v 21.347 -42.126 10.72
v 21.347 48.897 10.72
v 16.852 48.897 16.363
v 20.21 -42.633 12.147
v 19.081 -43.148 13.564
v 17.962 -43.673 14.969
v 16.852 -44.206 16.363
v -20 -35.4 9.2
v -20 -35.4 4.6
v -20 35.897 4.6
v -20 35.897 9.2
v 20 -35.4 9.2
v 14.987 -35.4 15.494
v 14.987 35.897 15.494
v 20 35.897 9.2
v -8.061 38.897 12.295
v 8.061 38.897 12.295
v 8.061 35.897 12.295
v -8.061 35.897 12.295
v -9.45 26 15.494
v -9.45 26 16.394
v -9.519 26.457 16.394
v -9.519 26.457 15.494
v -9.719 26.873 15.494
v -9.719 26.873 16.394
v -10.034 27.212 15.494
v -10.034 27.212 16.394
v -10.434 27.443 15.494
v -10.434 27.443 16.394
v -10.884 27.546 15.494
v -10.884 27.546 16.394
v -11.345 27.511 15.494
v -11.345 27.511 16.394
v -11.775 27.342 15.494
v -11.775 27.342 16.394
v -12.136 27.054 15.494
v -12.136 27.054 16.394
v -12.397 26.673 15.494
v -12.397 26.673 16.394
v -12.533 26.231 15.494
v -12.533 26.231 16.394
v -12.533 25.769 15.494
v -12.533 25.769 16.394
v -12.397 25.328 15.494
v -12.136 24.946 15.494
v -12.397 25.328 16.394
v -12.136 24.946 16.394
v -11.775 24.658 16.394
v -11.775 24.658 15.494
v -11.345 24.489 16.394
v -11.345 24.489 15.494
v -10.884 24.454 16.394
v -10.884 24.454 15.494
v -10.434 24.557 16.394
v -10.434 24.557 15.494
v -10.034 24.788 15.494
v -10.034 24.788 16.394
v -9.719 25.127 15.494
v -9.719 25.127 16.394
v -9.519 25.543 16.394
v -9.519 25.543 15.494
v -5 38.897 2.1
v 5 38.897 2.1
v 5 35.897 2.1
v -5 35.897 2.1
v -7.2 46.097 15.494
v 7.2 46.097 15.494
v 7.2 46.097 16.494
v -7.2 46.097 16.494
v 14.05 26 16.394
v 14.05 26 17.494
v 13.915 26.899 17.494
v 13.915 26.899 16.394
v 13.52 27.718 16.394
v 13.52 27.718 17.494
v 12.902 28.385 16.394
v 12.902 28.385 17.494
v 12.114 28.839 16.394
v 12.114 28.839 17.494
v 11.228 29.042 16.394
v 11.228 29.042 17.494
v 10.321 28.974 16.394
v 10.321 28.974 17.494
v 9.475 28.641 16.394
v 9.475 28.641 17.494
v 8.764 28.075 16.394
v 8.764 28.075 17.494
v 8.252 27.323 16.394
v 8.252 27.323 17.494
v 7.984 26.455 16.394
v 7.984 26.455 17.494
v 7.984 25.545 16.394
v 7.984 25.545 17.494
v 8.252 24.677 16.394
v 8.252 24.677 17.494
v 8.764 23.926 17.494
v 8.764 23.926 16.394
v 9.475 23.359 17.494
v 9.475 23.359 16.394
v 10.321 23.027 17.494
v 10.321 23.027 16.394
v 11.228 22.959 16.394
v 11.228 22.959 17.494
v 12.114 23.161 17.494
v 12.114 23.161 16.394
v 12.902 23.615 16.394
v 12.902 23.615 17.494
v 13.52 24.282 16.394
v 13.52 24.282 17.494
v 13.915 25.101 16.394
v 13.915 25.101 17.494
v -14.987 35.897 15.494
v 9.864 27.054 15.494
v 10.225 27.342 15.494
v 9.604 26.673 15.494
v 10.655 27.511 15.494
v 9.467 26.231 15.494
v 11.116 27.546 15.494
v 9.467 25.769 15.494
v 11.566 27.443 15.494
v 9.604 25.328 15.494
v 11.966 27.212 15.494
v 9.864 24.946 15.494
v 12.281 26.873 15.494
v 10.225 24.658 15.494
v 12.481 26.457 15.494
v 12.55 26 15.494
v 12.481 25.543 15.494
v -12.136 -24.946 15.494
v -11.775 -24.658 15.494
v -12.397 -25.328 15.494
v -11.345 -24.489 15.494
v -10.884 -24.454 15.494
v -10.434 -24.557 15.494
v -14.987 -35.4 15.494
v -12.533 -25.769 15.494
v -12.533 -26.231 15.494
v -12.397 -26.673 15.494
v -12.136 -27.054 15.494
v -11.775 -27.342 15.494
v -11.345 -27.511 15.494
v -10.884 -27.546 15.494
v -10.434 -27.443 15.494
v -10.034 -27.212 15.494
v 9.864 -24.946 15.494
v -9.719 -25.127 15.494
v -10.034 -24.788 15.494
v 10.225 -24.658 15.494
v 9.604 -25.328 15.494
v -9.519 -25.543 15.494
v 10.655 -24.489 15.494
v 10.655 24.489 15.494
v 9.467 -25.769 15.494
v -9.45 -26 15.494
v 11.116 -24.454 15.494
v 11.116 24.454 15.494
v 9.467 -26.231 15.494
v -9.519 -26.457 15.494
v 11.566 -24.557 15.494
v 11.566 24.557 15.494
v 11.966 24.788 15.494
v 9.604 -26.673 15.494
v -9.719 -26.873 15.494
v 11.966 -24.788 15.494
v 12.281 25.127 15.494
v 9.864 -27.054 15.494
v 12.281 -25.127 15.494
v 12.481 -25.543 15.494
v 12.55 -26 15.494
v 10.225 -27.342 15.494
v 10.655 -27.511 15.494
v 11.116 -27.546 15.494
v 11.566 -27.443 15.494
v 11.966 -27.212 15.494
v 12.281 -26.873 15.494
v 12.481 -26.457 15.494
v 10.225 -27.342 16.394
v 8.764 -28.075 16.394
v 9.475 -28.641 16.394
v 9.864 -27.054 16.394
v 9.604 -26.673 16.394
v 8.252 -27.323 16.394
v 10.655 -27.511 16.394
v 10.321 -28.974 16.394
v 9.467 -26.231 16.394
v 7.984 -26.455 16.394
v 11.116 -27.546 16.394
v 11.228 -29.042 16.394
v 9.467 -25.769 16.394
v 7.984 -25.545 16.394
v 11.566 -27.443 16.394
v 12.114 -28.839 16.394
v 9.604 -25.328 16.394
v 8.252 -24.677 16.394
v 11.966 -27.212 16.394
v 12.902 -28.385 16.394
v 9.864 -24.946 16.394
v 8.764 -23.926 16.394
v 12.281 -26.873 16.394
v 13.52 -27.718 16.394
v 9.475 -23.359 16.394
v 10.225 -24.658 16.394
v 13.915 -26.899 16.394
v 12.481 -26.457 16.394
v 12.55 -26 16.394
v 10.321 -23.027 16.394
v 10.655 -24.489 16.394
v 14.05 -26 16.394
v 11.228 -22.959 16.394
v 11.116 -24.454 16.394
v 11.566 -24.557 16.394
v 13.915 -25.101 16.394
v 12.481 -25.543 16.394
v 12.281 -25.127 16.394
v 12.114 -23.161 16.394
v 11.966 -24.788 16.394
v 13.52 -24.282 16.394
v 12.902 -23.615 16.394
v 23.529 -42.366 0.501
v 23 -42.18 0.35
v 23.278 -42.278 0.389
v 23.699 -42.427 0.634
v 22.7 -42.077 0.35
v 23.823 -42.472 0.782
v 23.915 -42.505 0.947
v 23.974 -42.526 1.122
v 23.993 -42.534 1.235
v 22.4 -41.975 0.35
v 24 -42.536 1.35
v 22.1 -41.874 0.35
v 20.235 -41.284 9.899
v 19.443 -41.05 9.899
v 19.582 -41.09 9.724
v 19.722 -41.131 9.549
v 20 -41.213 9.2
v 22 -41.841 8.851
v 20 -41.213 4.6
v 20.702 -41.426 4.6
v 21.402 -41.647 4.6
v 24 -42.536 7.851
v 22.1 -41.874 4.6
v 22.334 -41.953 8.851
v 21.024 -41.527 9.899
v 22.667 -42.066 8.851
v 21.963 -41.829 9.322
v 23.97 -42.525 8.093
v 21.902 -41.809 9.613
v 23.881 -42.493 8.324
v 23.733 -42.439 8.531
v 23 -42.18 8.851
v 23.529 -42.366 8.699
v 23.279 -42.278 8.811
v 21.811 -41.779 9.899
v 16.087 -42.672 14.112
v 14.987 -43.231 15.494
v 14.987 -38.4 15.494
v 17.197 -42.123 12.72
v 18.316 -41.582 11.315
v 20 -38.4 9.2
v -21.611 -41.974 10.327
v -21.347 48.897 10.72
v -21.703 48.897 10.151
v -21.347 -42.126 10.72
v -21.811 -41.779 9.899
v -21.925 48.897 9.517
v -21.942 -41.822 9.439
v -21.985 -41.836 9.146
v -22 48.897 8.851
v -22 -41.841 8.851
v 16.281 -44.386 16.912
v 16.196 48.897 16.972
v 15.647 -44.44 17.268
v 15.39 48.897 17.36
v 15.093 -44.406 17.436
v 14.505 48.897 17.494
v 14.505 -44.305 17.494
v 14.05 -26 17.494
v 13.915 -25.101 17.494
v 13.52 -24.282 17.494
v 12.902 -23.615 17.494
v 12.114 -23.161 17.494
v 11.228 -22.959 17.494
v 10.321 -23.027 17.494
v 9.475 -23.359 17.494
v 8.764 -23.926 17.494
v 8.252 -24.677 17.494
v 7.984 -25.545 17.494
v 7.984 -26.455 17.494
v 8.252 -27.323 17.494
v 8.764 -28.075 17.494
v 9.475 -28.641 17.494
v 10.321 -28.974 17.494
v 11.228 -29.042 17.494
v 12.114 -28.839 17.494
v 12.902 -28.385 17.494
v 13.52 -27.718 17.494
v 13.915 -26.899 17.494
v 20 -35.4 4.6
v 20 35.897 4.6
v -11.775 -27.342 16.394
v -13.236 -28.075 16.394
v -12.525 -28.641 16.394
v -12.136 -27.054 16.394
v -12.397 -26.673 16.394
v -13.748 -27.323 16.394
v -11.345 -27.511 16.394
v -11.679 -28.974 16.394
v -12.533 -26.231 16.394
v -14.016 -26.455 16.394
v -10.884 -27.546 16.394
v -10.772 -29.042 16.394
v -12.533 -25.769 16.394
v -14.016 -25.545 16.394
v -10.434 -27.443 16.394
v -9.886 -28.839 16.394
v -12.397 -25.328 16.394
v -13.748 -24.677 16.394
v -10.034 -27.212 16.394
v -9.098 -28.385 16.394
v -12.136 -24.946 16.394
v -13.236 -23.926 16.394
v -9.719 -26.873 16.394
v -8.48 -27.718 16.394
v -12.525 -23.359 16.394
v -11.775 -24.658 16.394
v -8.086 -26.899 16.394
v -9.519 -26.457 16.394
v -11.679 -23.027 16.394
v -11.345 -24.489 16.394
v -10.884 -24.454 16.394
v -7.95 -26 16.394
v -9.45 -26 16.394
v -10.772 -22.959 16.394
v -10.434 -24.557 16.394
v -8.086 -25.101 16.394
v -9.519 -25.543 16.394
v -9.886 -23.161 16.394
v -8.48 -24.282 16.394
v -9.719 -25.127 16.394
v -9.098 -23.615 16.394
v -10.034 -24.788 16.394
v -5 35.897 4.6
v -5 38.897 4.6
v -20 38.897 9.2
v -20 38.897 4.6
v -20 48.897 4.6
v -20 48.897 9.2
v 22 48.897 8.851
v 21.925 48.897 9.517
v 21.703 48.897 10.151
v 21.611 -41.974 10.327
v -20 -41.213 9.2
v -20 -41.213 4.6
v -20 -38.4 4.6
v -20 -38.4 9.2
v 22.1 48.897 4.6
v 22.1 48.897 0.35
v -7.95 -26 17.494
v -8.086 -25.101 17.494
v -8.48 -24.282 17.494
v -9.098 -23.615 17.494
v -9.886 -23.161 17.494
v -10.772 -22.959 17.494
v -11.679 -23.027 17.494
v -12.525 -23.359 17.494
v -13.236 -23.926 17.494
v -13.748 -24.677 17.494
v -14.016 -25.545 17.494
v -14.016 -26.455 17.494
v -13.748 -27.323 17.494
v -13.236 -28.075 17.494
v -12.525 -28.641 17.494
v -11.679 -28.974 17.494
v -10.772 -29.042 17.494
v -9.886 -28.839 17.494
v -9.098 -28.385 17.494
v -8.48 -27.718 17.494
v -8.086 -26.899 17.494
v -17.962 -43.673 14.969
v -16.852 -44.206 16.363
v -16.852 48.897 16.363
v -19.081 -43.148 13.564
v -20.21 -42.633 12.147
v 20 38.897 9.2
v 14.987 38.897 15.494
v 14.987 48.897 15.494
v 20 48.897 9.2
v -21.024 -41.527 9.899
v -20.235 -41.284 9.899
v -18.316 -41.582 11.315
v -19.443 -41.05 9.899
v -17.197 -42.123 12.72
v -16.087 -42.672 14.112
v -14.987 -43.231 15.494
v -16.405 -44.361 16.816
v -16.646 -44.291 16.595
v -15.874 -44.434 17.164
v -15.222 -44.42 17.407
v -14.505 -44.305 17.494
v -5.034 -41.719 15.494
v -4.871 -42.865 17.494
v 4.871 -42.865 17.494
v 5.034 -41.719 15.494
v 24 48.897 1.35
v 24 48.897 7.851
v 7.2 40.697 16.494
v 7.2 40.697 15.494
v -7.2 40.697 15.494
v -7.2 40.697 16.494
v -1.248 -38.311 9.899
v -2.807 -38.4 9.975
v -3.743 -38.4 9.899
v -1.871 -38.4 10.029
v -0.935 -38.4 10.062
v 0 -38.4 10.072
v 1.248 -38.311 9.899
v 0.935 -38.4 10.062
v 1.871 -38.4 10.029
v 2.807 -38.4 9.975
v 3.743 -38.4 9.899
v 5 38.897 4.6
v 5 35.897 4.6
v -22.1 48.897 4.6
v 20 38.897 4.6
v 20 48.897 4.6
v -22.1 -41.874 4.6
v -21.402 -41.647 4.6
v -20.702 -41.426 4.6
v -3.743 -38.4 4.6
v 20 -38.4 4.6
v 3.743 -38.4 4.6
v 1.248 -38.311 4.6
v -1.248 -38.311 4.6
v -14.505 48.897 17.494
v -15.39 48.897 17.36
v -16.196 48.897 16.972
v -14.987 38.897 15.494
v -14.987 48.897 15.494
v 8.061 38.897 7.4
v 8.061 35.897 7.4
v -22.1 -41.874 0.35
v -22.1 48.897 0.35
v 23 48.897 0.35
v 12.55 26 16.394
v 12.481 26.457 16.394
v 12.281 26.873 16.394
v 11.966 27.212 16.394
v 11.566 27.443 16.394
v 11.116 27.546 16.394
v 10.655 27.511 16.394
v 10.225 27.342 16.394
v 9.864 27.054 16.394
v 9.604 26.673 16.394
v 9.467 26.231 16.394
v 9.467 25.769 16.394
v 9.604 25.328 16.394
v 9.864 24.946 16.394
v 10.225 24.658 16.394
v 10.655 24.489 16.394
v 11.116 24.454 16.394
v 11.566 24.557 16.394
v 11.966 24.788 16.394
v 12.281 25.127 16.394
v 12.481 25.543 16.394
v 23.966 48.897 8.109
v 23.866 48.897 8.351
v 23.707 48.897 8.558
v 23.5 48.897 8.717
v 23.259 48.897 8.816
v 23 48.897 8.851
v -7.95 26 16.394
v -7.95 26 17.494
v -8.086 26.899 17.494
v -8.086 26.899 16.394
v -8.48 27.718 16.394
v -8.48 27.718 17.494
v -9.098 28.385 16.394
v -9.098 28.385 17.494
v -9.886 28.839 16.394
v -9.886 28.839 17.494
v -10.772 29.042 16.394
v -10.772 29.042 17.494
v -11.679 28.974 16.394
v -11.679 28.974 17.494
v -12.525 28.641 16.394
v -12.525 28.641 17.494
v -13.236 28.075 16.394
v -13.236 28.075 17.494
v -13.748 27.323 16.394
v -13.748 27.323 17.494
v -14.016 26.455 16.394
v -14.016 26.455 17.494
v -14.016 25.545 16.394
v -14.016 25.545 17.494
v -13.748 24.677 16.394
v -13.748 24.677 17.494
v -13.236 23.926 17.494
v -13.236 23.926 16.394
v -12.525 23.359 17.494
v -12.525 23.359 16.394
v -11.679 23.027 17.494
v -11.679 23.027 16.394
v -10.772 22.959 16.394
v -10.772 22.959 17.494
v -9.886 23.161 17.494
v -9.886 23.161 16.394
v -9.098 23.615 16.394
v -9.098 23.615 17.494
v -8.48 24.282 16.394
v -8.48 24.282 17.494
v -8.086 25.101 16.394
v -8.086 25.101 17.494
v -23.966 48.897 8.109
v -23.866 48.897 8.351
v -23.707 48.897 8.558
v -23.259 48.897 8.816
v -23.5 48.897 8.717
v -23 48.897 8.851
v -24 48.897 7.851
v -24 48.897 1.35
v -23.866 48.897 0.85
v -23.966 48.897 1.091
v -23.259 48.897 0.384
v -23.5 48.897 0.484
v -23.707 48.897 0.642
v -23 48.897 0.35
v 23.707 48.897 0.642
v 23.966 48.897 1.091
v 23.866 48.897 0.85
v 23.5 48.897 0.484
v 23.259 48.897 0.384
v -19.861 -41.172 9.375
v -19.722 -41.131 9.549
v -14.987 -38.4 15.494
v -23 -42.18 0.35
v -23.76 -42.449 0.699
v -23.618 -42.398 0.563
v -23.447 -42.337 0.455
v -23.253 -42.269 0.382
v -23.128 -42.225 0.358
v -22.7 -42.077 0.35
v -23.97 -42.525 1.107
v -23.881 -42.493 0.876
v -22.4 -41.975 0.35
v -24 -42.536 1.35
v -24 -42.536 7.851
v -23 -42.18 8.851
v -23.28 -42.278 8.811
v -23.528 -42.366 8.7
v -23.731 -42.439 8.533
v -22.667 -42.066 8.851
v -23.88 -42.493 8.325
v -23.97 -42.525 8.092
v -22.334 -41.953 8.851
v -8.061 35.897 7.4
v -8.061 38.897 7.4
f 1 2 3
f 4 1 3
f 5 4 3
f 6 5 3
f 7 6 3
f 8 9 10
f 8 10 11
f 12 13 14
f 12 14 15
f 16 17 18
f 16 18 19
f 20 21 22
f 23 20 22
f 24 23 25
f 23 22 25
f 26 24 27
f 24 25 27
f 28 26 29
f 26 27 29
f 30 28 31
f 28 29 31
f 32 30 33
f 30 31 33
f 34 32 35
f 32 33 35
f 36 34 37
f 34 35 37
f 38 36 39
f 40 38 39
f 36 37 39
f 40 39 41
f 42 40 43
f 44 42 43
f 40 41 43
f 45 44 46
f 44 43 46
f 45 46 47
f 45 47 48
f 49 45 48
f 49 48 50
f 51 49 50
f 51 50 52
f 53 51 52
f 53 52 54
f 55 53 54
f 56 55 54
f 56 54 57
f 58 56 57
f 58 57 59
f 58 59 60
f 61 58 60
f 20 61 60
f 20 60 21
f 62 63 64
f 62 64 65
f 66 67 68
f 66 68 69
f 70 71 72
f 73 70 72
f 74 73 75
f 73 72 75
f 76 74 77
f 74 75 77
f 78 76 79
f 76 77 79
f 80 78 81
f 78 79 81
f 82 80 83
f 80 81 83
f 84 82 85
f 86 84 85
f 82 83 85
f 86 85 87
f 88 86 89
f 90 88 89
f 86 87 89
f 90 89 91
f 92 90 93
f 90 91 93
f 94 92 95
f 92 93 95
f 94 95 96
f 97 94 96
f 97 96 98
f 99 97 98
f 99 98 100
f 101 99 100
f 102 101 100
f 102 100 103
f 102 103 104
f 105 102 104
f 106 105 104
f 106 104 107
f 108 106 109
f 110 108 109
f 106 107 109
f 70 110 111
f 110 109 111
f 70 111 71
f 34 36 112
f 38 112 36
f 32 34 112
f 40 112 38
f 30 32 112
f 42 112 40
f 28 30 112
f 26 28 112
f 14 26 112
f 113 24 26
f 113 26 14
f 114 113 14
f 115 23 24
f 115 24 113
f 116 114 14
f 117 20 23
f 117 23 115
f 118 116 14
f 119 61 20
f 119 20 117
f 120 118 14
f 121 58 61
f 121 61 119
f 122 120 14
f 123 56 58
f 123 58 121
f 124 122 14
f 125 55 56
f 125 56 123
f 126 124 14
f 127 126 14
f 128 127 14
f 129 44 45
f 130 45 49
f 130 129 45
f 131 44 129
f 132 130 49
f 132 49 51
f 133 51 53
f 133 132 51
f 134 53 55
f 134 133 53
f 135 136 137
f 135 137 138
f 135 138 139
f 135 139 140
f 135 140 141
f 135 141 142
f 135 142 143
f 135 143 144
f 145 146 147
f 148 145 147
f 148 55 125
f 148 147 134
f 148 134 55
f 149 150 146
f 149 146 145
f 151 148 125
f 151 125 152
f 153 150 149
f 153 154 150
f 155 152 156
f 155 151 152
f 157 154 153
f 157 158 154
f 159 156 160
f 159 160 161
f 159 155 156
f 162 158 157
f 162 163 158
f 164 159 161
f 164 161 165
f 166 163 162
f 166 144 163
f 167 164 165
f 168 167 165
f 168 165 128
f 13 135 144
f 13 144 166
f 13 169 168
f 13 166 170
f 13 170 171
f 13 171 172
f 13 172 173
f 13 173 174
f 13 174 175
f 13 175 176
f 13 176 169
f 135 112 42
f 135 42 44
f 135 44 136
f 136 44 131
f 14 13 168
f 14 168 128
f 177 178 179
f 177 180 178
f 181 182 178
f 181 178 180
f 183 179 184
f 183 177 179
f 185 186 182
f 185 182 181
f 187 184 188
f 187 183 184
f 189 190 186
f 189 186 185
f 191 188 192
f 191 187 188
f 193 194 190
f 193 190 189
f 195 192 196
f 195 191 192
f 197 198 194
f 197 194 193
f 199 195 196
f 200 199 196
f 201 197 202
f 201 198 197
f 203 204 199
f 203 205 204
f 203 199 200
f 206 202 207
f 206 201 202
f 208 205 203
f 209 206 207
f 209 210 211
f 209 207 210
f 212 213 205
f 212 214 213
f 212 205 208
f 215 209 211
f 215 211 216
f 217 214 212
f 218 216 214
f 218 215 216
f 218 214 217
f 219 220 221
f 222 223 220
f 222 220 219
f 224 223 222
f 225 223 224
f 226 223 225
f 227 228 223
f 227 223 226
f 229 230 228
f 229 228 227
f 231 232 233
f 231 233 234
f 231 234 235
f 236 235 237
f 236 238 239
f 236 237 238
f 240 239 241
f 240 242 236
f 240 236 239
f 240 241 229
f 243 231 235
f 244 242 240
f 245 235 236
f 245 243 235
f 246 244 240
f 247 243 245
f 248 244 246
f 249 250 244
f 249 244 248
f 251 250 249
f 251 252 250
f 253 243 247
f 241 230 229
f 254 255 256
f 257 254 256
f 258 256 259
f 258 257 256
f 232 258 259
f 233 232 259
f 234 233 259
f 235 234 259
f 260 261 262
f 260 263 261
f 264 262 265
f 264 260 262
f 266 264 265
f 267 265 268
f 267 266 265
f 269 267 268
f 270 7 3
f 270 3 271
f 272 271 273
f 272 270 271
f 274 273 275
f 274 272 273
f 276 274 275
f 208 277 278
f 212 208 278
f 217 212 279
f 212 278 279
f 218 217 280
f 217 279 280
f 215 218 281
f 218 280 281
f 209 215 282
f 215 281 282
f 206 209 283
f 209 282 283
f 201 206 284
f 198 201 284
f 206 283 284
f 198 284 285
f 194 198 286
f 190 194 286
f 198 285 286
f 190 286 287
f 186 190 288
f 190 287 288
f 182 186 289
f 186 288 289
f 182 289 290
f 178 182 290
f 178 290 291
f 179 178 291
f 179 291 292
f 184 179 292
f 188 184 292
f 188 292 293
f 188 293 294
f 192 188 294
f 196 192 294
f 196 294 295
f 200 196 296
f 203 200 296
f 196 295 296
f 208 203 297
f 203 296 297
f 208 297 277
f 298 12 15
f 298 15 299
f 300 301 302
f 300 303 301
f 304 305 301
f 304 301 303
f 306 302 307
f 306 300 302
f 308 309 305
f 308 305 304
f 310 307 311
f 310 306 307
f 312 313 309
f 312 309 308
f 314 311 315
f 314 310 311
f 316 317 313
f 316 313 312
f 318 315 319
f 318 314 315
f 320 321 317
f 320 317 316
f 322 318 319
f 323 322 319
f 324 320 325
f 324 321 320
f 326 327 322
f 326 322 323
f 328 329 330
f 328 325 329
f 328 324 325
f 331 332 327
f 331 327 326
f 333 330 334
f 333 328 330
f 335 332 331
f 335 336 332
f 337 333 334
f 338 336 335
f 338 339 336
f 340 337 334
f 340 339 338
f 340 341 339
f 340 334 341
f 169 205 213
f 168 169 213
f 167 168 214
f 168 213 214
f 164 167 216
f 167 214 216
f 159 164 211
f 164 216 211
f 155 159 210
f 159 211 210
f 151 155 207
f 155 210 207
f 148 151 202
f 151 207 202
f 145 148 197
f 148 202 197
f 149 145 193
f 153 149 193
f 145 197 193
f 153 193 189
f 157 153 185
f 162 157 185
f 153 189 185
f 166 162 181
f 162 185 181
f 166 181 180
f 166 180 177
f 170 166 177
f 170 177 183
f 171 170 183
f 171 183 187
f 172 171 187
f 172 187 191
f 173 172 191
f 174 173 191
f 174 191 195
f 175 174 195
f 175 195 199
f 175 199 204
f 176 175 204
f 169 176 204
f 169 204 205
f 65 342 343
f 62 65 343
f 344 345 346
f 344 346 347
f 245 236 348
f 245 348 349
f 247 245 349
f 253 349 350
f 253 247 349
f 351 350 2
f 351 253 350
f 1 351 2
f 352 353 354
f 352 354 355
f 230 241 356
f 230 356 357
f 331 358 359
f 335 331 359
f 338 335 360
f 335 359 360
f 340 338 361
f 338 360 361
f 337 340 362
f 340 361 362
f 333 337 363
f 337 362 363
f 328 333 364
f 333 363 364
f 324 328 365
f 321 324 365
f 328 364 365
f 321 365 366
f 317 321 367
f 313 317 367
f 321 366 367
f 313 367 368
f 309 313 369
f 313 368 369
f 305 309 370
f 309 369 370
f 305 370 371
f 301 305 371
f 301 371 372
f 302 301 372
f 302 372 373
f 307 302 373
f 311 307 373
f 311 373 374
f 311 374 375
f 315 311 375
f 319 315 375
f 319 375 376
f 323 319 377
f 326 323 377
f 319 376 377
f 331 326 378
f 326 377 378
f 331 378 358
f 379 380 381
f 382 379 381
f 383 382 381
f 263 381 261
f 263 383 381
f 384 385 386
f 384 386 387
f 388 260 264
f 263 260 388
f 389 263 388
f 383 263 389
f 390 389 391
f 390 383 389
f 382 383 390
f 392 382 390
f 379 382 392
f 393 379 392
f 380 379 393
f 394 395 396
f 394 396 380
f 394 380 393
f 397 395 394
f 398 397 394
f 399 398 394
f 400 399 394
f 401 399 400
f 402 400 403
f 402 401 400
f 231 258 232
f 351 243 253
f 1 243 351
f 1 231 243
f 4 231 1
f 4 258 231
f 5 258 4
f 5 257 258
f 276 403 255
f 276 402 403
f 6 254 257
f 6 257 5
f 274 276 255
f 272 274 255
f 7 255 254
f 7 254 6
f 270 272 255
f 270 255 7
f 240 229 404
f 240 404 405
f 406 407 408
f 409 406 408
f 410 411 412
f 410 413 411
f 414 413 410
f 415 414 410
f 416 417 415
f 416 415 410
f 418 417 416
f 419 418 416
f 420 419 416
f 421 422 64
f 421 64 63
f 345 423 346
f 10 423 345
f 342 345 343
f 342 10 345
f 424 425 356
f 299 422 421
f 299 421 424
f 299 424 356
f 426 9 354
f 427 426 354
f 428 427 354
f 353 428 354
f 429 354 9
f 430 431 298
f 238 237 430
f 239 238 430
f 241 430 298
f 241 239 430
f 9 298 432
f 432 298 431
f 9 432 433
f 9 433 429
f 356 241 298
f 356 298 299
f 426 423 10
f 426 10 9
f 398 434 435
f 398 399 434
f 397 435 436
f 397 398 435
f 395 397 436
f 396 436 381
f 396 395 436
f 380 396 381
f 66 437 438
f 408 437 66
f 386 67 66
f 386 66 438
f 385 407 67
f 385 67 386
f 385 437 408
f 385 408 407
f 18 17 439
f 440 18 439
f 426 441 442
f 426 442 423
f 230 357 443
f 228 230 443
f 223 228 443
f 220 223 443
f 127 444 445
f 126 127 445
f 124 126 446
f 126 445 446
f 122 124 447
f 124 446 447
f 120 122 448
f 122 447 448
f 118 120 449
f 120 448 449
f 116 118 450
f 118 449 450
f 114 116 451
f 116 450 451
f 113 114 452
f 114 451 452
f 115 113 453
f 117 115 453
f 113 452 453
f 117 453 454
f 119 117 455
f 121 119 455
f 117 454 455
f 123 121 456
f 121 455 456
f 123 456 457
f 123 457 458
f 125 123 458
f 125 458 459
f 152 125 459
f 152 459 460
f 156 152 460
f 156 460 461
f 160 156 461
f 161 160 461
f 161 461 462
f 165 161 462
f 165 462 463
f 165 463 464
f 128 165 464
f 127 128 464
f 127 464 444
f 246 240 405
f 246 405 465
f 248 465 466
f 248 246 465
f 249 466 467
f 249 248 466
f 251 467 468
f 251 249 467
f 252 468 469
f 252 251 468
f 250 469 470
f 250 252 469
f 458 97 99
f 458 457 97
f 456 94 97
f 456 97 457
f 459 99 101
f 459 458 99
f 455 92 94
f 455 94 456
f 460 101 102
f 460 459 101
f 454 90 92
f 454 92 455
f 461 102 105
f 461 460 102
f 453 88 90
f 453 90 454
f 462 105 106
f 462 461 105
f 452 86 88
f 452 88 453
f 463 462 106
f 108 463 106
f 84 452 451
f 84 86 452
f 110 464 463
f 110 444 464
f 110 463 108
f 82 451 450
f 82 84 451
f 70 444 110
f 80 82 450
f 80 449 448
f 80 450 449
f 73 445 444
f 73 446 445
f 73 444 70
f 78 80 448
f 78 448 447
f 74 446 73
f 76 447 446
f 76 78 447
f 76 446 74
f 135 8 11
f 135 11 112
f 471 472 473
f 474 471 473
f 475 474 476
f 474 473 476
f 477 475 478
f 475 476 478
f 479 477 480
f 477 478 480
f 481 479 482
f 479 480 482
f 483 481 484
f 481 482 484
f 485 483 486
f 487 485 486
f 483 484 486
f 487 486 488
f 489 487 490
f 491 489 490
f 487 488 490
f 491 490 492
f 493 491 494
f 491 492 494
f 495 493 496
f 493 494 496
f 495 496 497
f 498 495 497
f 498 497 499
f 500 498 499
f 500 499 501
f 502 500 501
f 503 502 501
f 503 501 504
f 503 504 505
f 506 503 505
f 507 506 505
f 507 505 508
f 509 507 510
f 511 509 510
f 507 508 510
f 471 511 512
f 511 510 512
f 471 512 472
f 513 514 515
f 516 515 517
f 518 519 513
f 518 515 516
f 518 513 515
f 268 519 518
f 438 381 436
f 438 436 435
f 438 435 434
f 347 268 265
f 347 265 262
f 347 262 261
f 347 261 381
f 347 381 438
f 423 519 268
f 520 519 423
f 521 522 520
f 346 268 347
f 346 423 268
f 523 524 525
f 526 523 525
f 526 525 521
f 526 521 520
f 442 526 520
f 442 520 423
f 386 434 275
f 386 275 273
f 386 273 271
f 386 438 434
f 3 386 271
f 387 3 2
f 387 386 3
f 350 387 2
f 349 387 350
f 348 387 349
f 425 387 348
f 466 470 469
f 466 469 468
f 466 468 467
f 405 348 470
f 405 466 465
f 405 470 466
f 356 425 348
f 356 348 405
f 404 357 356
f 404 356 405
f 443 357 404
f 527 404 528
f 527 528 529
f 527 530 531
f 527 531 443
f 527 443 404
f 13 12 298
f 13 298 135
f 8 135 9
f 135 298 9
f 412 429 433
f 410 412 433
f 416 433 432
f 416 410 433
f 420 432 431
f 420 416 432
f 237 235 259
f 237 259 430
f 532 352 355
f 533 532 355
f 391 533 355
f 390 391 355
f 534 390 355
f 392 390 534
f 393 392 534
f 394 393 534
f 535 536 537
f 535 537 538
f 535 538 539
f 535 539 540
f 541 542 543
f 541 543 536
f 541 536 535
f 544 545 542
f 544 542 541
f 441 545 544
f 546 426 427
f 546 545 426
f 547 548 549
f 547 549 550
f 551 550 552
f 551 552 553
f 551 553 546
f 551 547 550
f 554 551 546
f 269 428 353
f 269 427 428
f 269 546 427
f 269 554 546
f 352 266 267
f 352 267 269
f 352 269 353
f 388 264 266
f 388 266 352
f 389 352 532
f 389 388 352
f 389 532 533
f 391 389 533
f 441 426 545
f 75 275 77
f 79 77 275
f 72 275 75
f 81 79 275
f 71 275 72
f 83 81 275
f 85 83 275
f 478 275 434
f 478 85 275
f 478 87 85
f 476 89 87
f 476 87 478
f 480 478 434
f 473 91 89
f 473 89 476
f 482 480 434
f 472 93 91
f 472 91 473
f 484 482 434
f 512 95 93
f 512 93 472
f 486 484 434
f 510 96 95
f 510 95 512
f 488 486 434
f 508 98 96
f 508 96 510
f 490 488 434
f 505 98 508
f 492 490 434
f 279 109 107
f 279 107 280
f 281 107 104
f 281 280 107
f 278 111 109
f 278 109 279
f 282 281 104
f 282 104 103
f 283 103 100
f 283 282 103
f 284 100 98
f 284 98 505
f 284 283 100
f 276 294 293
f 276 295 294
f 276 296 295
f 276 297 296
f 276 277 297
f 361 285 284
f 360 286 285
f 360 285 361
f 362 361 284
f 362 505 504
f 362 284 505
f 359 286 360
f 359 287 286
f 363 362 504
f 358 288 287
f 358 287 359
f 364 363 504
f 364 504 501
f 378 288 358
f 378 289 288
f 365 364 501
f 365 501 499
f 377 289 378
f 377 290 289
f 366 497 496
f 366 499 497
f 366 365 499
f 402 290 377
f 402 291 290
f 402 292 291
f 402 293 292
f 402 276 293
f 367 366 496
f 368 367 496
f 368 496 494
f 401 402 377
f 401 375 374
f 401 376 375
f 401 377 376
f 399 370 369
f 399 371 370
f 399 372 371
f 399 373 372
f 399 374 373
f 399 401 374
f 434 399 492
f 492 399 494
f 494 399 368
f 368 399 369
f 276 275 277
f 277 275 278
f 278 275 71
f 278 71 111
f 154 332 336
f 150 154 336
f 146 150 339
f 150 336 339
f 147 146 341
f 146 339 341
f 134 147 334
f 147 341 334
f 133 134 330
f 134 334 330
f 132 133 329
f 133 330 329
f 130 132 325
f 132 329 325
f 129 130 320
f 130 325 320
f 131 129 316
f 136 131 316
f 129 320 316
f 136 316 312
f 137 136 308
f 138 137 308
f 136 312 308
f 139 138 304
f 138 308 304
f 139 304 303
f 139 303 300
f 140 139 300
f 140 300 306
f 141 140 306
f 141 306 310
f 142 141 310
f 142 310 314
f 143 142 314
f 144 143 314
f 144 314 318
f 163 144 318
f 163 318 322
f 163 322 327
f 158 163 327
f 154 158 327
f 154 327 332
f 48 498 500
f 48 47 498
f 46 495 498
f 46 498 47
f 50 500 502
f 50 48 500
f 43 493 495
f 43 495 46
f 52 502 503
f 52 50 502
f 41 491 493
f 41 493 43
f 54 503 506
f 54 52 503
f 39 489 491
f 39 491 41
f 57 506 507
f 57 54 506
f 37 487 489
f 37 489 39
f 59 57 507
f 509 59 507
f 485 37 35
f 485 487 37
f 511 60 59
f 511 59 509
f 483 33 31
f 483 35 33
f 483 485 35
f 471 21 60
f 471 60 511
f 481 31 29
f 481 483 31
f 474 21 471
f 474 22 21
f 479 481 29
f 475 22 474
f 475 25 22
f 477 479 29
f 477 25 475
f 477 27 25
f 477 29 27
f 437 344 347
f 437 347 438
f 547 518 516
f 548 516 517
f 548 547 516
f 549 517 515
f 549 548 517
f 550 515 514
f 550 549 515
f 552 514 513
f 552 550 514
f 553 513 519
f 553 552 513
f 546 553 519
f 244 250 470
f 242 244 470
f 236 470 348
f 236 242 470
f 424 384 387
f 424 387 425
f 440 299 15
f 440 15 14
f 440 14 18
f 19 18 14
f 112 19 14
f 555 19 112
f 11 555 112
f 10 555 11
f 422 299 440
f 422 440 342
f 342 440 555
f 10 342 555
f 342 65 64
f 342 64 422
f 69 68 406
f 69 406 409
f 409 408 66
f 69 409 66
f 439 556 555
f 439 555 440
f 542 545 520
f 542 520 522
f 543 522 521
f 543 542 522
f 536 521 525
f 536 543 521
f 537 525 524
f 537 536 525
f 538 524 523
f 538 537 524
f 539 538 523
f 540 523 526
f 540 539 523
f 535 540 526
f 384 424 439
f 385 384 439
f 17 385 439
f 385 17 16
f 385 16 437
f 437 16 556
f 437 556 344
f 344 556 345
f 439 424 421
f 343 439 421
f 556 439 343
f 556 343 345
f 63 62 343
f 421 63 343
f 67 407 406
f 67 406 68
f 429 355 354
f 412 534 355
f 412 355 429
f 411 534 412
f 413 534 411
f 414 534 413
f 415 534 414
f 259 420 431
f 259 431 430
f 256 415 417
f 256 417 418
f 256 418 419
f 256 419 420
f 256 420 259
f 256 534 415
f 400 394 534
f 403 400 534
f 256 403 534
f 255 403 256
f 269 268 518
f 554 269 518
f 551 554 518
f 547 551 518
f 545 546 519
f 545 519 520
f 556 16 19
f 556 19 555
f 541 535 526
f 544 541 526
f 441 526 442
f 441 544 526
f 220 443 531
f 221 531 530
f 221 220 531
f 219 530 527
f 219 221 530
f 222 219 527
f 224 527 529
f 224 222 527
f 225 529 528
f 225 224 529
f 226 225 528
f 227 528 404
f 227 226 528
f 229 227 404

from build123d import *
from OCP.BRepAlgoAPI import BRepAlgoAPI_Cut
from OCP.TopTools import TopTools_ListOfShape

# Parameters (mm, degrees)
EXTRUDE_1_DEPTH     = 58.89737674
EXTRUDE_START       = 38.399597665
EXTRUDE_2_DEPTH     = 38.399597665
EXTRUDE_3_REACH     = 66.893
SKETCH_3_W          = 44.2
SKETCH_3_H          = 3
EXTRUDE_4_REACH     = 66.893
SKETCH_4_W          = 44.2
SKETCH_4_H          = 3
CUT_EXTRUDE_START   = -77.29697691
CUT_EXTRUDE_1_DEPTH = 77.29697691
SKETCH_6_W          = 16.122631446
SKETCH_6_H          = 4.394864928
CUT_EXTRUDE_2_DEPTH = 3
EXTRUDE_START_2     = 15
EXTRUDE_5_DEPTH     = 15
SKETCH_11_R         = 3.05
CUT_EXTRUDE_4_DEPTH = 1.1
CUT_EXTRUDE_START_2 = -10
CUT_EXTRUDE_5_DEPTH = 10
SKETCH_14_R         = 1.55
CUT_EXTRUDE_6_DEPTH = 57.783530783
SKETCH_15_W         = 16.122631446
SKETCH_15_H         = 3
CUT_EXTRUDE_7_DEPTH = 0.5
SKETCH_16_W         = 10
SKETCH_16_H         = 3
EXTRUDE_6_DEPTH     = 2.5
SKETCH_17_W         = 14.4
SKETCH_17_H         = 5.4
CUT_EXTRUDE_8_DEPTH = 1


with BuildPart() as part:
    # 草图1 → 凸台-拉伸1 (new body)
    with BuildSketch(Plane(origin=(0, 0, 0), x_dir=(1, 0, 0), z_dir=(0, 1, 0))):
        with BuildLine():
            Line((21.346642729, -10.719560241), (16.852020459, -16.362765964))
            ThreePointArc((16.852020459, -16.362765964), (15.807857901, -17.196247295), (14.505374257, -17.493741725))
            Line((14.505374257, -17.493741725), (-14.505381202, -17.493741725))
            ThreePointArc((-14.505381202, -17.493741725), (-15.807864846, -17.196247295), (-16.852027404, -16.362765964))
            Line((-16.852027404, -16.362765964), (-21.346649674, -10.719560241))
            ThreePointArc((-21.346649674, -10.719560241), (-21.831958504, -9.840501001), (-22.000003473, -8.850536003))
            Line((-22.000003473, -8.850536003), (-23.000003473, -8.850536003))
            ThreePointArc((-23.000003473, -8.850536003), (-23.707110254, -8.557642784), (-24.000003473, -7.850536003))
            Line((-24.000003473, -7.850536003), (-24.000003473, -1.349569462))
            ThreePointArc((-24.000003473, -1.349569462), (-23.707110254, -0.642462681), (-23.000003473, -0.349569462))
            Line((-23.000003473, -0.349569462), (-22.100003473, -0.349569462))
            Line((-22.100003473, -0.349569462), (-22.100003473, -4.600052733))
            Line((-22.100003473, -4.600052733), (-22.000003473, -4.600052733))
            Line((-22.000003473, -4.600052733), (-20.000003473, -4.600052733))
            Line((-20.000003473, -4.600052733), (-20.000003473, -9.200105465))
            Line((-20.000003473, -9.200105465), (-14.987335304, -15.493741725))
            Line((-14.987335304, -15.493741725), (14.987328359, -15.493741725))
            Line((14.987328359, -15.493741725), (19.999996527, -9.200105465))
            Line((19.999996527, -9.200105465), (19.999996527, -4.600052733))
            Line((19.999996527, -4.600052733), (21.999996527, -4.600052733))
            Line((21.999996527, -4.600052733), (22.099996527, -4.600052733))
            Line((22.099996527, -4.600052733), (22.099996527, -0.349569462))
            Line((22.099996527, -0.349569462), (22.999996527, -0.349569462))
            ThreePointArc((22.999996527, -0.349569462), (23.707103309, -0.642462681), (23.999996527, -1.349569462))
            Line((23.999996527, -1.349569462), (23.999996527, -7.850536003))
            ThreePointArc((23.999996527, -7.850536003), (23.707103309, -8.557642784), (22.999996527, -8.850536003))
            Line((22.999996527, -8.850536003), (21.999996527, -8.850536003))
            ThreePointArc((21.999996527, -8.850536003), (21.831951559, -9.840501001), (21.346642729, -10.719560241))
        make_face()
    extrude(amount=EXTRUDE_1_DEPTH)

    # 草图2 → 凸台-拉伸2 (add)
    with BuildSketch(Plane.XZ.offset(EXTRUDE_START)):
        with BuildLine():
            Line((22.999996527, 8.850536003), (21.999996527, 8.850536003))
            ThreePointArc((21.999996527, 8.850536003), (21.831951559, 9.840501001), (21.346642729, 10.719560241))
            Line((21.346642729, 10.719560241), (16.852020459, 16.362765964))
            ThreePointArc((16.852020459, 16.362765964), (15.807857901, 17.196247295), (14.505374257, 17.493741725))
            Line((14.505374257, 17.493741725), (-14.505381202, 17.493741725))
            ThreePointArc((-14.505381202, 17.493741725), (-15.807864846, 17.196247295), (-16.852027404, 16.362765964))
            Line((-16.852027404, 16.362765964), (-21.346649674, 10.719560241))
            ThreePointArc((-21.346649674, 10.719560241), (-21.831958504, 9.840501001), (-22.000003473, 8.850536003))
            Line((-22.000003473, 8.850536003), (-23.000003473, 8.850536003))
            ThreePointArc((-23.000003473, 8.850536003), (-23.707110254, 8.557642784), (-24.000003473, 7.850536003))
            Line((-24.000003473, 7.850536003), (-24.000003473, 1.349569462))
            ThreePointArc((-24.000003473, 1.349569462), (-23.707110254, 0.642462681), (-23.000003473, 0.349569462))
            Line((-23.000003473, 0.349569462), (-22.100003473, 0.349569462))
            Line((-22.100003473, 0.349569462), (-22.100003473, 4.600052733))
            Line((-22.100003473, 4.600052733), (-20.000003473, 4.600052733))
            Line((-20.000003473, 4.600052733), (-20.000003473, 9.200105465))
            Line((-20.000003473, 9.200105465), (-14.987335304, 15.493741725))
            Line((-14.987335304, 15.493741725), (14.987328359, 15.493741725))
            Line((14.987328359, 15.493741725), (19.999996527, 9.200105465))
            Line((19.999996527, 9.200105465), (19.999996527, 4.600052733))
            Line((19.999996527, 4.600052733), (22.099996527, 4.600052733))
            Line((22.099996527, 4.600052733), (22.099996527, 0.349569462))
            Line((22.099996527, 0.349569462), (22.999996527, 0.349569462))
            ThreePointArc((22.999996527, 0.349569462), (23.707103309, 0.642462681), (23.999996527, 1.349569462))
            Line((23.999996527, 1.349569462), (23.999996527, 7.850536003))
            ThreePointArc((23.999996527, 7.850536003), (23.707103309, 8.557642784), (22.999996527, 8.850536003))
        make_face()
    extrude(amount=-EXTRUDE_2_DEPTH)

    # 凸台-拉伸3: up to this face of the body (flat: up to its plane)
    extrude_3_end = Plane(part.part.faces().sort_by_distance((-3.473e-06, 10.248889538, 17.493741725))[0])
    # 草图3 → 凸台-拉伸3 (add, up to the picked face)
    with BuildSketch(Plane(origin=(0, 0, 4.600052733), x_dir=(-1, 0, 0), z_dir=(0, 0, -1)), mode=Mode.PRIVATE) as extrude_3_sk1:
        with Locations((3.473e-06, -36.899597665)):
            Rectangle(SKETCH_3_W, SKETCH_3_H)
    extrude_3_tool1 = split(extrude(extrude_3_sk1.sketch, amount=-EXTRUDE_3_REACH, mode=Mode.PRIVATE), bisect_by=extrude_3_end, keep=Keep.BOTH, mode=Mode.PRIVATE)
    add(extrude_3_tool1.solids().sort_by(Axis((-3e-06, -36.899598, 4.600053), (0, 0, 1)))[0])

    # 凸台-拉伸4: up to this face of the body (flat: up to its plane)
    extrude_4_end = Plane(part.part.faces().sort_by_distance((-3.473e-06, 9.499837909, 17.493741725))[0])
    # 草图4 → 凸台-拉伸4 (add, up to the picked face)
    with BuildSketch(Plane(origin=(0, 0, 4.600052733), x_dir=(-1, 0, 0), z_dir=(0, 0, -1)), mode=Mode.PRIVATE) as extrude_4_sk1:
        with Locations((3.473e-06, 37.397379245)):
            Rectangle(SKETCH_4_W, SKETCH_4_H)
    extrude_4_tool1 = split(extrude(extrude_4_sk1.sketch, amount=-EXTRUDE_4_REACH, mode=Mode.PRIVATE), bisect_by=extrude_4_end, keep=Keep.BOTH, mode=Mode.PRIVATE)
    add(extrude_4_tool1.solids().sort_by(Axis((-3e-06, 37.397379, 4.600053), (0, 0, 1)))[0])

    # 草图5 → 切除-拉伸1 (cut)
    with BuildSketch(Plane(origin=(0, 38.897379245, 0), x_dir=(1, 0, 0), z_dir=(0, 1, 0)).offset(CUT_EXTRUDE_START)):
        with BuildLine():
            Line((-22.100003473, -8.850536003), (-22.100003473, -17.493741725))
            Line((-22.100003473, -17.493741725), (-14.505381202, -17.493741725))
            ThreePointArc((-14.505381202, -17.493741725), (-15.807864846, -17.196247295), (-16.852027404, -16.362765964))
            Line((-16.852027404, -16.362765964), (-21.346649674, -10.719560241))
            ThreePointArc((-21.346649674, -10.719560241), (-21.831958504, -9.840501001), (-22.000003473, -8.850536003))
            Line((-22.000003473, -8.850536003), (-22.100003473, -8.850536003))
        make_face()
        with BuildLine():
            Line((14.505374257, -17.493741725), (22.099996527, -17.493741725))
            Line((22.099996527, -17.493741725), (22.099996527, -8.850536003))
            Line((22.099996527, -8.850536003), (21.999996527, -8.850536003))
            ThreePointArc((21.999996527, -8.850536003), (21.831951559, -9.840501001), (21.346642729, -10.719560241))
            Line((21.346642729, -10.719560241), (16.852020459, -16.362765964))
            ThreePointArc((16.852020459, -16.362765964), (15.807857901, -17.196247295), (14.505374257, -17.493741725))
        make_face()
    extrude(amount=CUT_EXTRUDE_1_DEPTH, mode=Mode.SUBTRACT)

    # 草图6 → 切除-拉伸2 (cut)
    with BuildSketch(Plane(origin=(0, 38.897379245, 0), x_dir=(1, 0, 0), z_dir=(0, 1, 0))):
        with Locations((0, -9.597483264)):
            Rectangle(SKETCH_6_W, SKETCH_6_H)
    extrude(amount=-CUT_EXTRUDE_2_DEPTH, mode=Mode.SUBTRACT)

    # 草图7 → 凸台-拉伸5 (add)
    with BuildSketch(Plane(origin=(0, -38.399597665, 0), x_dir=(-1, 0, 0), z_dir=(0, -1, 0)).offset(EXTRUDE_START_2)):
        with BuildLine():
            Line((20.000003473, -4.600052733), (20.000003473, -9.200105465))
            Line((20.000003473, -9.200105465), (14.987335304, -15.493741725))
            Line((14.987335304, -15.493741725), (-14.987328359, -15.493741725))
            Line((-14.987328359, -15.493741725), (-19.999996527, -9.200105465))
            Line((-19.999996527, -9.200105465), (-19.999996527, -4.600052733))
            Line((-19.999996527, -4.600052733), (-21.999996527, -4.600052733))
            Line((-21.999996527, -4.600052733), (-22.099996527, -4.600052733))
            Line((-22.099996527, -4.600052733), (-22.099996527, -0.349569462))
            Line((-22.099996527, -0.349569462), (-22.999996527, -0.349569462))
            ThreePointArc((-22.999996527, -0.349569462), (-23.707103309, -0.642462681), (-23.999996527, -1.349569462))
            Line((-23.999996527, -1.349569462), (-23.999996527, -7.850536003))
            ThreePointArc((-23.999996527, -7.850536003), (-23.707103309, -8.557642784), (-22.999996527, -8.850536003))
            Line((-22.999996527, -8.850536003), (-21.999996527, -8.850536003))
            ThreePointArc((-21.999996527, -8.850536003), (-21.831951559, -9.840501001), (-21.346642729, -10.719560241))
            Line((-21.346642729, -10.719560241), (-16.852020459, -16.362765964))
            ThreePointArc((-16.852020459, -16.362765964), (-15.807857901, -17.196247295), (-14.505374257, -17.493741725))
            Line((-14.505374257, -17.493741725), (14.505381202, -17.493741725))
            ThreePointArc((14.505381202, -17.493741725), (15.807864846, -17.196247295), (16.852027404, -16.362765964))
            Line((16.852027404, -16.362765964), (21.346649674, -10.719560241))
            ThreePointArc((21.346649674, -10.719560241), (21.831958504, -9.840501001), (22.000003473, -8.850536003))
            Line((22.000003473, -8.850536003), (23.000003473, -8.850536003))
            ThreePointArc((23.000003473, -8.850536003), (23.707110254, -8.557642784), (24.000003473, -7.850536003))
            Line((24.000003473, -7.850536003), (24.000003473, -1.349569462))
            ThreePointArc((24.000003473, -1.349569462), (23.707110254, -0.642462681), (23.000003473, -0.349569462))
            Line((23.000003473, -0.349569462), (22.100003473, -0.349569462))
            Line((22.100003473, -0.349569462), (22.100003473, -4.600052733))
            Line((22.100003473, -4.600052733), (22.000003473, -4.600052733))
            Line((22.000003473, -4.600052733), (20.000003473, -4.600052733))
        make_face()
    extrude(amount=-EXTRUDE_5_DEPTH)

    # 草图8 → 切除-旋转1 (revolve, cut)
    with BuildSketch(Plane(origin=(0, 0, 0), x_dir=(0, 0, -1), z_dir=(1, 0, 0))):
        Polygon((-9.89924439, -38.299597665), (-20.291549236, -44.299597665), (-20.291549236, -55.801852499), (11.09144377, -55.801852499), (11.09144377, -44.299597665), (0.699138925, -38.299597665), align=None)
    revolve(axis=Axis((0, -108.399597665, 9.89924439), (0, 0, -1)), mode=Mode.SUBTRACT)

    # 草图11 → 切除-拉伸4 (cut)
    with BuildSketch(Plane.XY.offset(17.493741725)):
        with Locations((-11.00002286, 26.0000508)):
            Circle(SKETCH_11_R)
        with Locations((11.00002032, 26.0000508)):
            Circle(SKETCH_11_R)
        with Locations((-11.00002286, -26.00005334)):
            Circle(SKETCH_11_R)
        with Locations((11.00002032, -26.00005334)):
            Circle(SKETCH_11_R)
    extrude(amount=-CUT_EXTRUDE_4_DEPTH, mode=Mode.SUBTRACT)


with BuildPart() as cut_extrude_5_tool:
    # 草图13 → 切除-拉伸5 (new body)
    with BuildSketch(Plane(origin=(-3.473e-06, 58.897378066, 0), x_dir=(0.9999999999999983, 5.895855893701837e-08, 0), z_dir=(-5.895855893701837e-08, 0.9999999999999983, 0)).offset(CUT_EXTRUDE_START_2)):
        with BuildLine():
            Line((-23, -8.850536003), (-22, -8.850536003))
            ThreePointArc((-22, -8.850536003), (-21.831955032, -9.840501001), (-21.346646202, -10.719560241))
            Line((-21.346646202, -10.719560241), (-16.852023931, -16.362765964))
            ThreePointArc((-16.852023931, -16.362765964), (-15.807861373, -17.196247295), (-14.50537773, -17.493741725))
            Line((-14.50537773, -17.493741725), (14.50537773, -17.493741725))
            ThreePointArc((14.50537773, -17.493741725), (15.807861373, -17.196247295), (16.852023931, -16.362765964))
            Line((16.852023931, -16.362765964), (21.346646202, -10.719560241))
            ThreePointArc((21.346646202, -10.719560241), (21.831955032, -9.840501001), (22, -8.850536003))
            Line((22, -8.850536003), (23, -8.850536003))
            ThreePointArc((23, -8.850536003), (23.707106781, -8.557642784), (24, -7.850536003))
            Line((24, -7.850536003), (24, -1.349569462))
            ThreePointArc((24, -1.349569462), (23.707106781, -0.642462681), (23, -0.349569462))
            Line((23, -0.349569462), (22.1, -0.349569462))
            Line((22.1, -0.349569462), (22.1, -4.600052733))
            Line((22.1, -4.600052733), (20, -4.600052733))
            Line((20, -4.600052733), (20, -9.200105465))
            Line((20, -9.200105465), (14.987331831, -15.493741725))
            Line((14.987331831, -15.493741725), (-14.987331831, -15.493741725))
            Line((-14.987331831, -15.493741725), (-20, -9.200105465))
            Line((-20, -9.200105465), (-20, -4.600052733))
            Line((-20, -4.600052733), (-22.1, -4.600052733))
            Line((-22.1, -4.600052733), (-22.1, -0.349569462))
            Line((-22.1, -0.349569462), (-23, -0.349569462))
            ThreePointArc((-23, -0.349569462), (-23.707106781, -0.642462681), (-24, -1.349569462))
            Line((-24, -1.349569462), (-24, -7.850536003))
            ThreePointArc((-24, -7.850536003), (-23.707106781, -8.557642784), (-23, -8.850536003))
        make_face()
    extrude(amount=CUT_EXTRUDE_5_DEPTH)


with BuildPart() as part_1:
    add(part.part)

    # 切除-拉伸5: cut by cut_extrude_5_tool, with a tolerance
    cut_extrude_5_stock = TopTools_ListOfShape()
    cut_extrude_5_stock.Append(part_1.part.wrapped)
    cut_extrude_5_tools = TopTools_ListOfShape()
    cut_extrude_5_tools.Append(cut_extrude_5_tool.part.wrapped)
    cut_extrude_5_cut = BRepAlgoAPI_Cut()
    cut_extrude_5_cut.SetArguments(cut_extrude_5_stock)
    cut_extrude_5_cut.SetTools(cut_extrude_5_tools)
    cut_extrude_5_cut.SetFuzzyValue(0.00001)
    cut_extrude_5_cut.Build()
    add(Compound.cast(cut_extrude_5_cut.Shape()).solids(), mode=Mode.REPLACE)

    # 草图14 → 切除-拉伸6 (cut, through all)
    with BuildSketch(Plane.XY.offset(16.393741725)):
        with Locations((-11.00002286, 26.0000508)):
            Circle(SKETCH_14_R)
        with Locations((11.00002032, 26.0000508)):
            Circle(SKETCH_14_R)
        with Locations((-11.00002286, -26.00005334)):
            Circle(SKETCH_14_R)
        with Locations((11.00002032, -26.00005334)):
            Circle(SKETCH_14_R)
    extrude(amount=-CUT_EXTRUDE_6_DEPTH, mode=Mode.SUBTRACT)

    # 草图15 → 切除-拉伸7 (cut)
    with BuildSketch(Plane(origin=(0, 0, 11.794915728), x_dir=(-1, 0, 0), z_dir=(0, 0, -1))):
        with Locations((0, 37.397379245)):
            Rectangle(SKETCH_15_W, SKETCH_15_H)
    extrude(amount=-CUT_EXTRUDE_7_DEPTH, mode=Mode.SUBTRACT)

    # 草图16 → 凸台-拉伸6 (add)
    with BuildSketch(Plane(origin=(0, 0, 4.600052733), x_dir=(-1, 0, 0), z_dir=(0, 0, -1))):
        with Locations((3.473e-06, 37.397379245)):
            Rectangle(SKETCH_16_W, SKETCH_16_H)
    extrude(amount=EXTRUDE_6_DEPTH)

    # 草图17 → 切除-拉伸8 (cut)
    with BuildSketch(Plane(origin=(0, 0, 15.493741725), x_dir=(-1, 0, 0), z_dir=(0, 0, -1))):
        with Locations((2.883e-06, 43.397377654)):
            Rectangle(SKETCH_17_W, SKETCH_17_H)
    extrude(amount=-CUT_EXTRUDE_8_DEPTH, mode=Mode.SUBTRACT)


solid = part_1.part
